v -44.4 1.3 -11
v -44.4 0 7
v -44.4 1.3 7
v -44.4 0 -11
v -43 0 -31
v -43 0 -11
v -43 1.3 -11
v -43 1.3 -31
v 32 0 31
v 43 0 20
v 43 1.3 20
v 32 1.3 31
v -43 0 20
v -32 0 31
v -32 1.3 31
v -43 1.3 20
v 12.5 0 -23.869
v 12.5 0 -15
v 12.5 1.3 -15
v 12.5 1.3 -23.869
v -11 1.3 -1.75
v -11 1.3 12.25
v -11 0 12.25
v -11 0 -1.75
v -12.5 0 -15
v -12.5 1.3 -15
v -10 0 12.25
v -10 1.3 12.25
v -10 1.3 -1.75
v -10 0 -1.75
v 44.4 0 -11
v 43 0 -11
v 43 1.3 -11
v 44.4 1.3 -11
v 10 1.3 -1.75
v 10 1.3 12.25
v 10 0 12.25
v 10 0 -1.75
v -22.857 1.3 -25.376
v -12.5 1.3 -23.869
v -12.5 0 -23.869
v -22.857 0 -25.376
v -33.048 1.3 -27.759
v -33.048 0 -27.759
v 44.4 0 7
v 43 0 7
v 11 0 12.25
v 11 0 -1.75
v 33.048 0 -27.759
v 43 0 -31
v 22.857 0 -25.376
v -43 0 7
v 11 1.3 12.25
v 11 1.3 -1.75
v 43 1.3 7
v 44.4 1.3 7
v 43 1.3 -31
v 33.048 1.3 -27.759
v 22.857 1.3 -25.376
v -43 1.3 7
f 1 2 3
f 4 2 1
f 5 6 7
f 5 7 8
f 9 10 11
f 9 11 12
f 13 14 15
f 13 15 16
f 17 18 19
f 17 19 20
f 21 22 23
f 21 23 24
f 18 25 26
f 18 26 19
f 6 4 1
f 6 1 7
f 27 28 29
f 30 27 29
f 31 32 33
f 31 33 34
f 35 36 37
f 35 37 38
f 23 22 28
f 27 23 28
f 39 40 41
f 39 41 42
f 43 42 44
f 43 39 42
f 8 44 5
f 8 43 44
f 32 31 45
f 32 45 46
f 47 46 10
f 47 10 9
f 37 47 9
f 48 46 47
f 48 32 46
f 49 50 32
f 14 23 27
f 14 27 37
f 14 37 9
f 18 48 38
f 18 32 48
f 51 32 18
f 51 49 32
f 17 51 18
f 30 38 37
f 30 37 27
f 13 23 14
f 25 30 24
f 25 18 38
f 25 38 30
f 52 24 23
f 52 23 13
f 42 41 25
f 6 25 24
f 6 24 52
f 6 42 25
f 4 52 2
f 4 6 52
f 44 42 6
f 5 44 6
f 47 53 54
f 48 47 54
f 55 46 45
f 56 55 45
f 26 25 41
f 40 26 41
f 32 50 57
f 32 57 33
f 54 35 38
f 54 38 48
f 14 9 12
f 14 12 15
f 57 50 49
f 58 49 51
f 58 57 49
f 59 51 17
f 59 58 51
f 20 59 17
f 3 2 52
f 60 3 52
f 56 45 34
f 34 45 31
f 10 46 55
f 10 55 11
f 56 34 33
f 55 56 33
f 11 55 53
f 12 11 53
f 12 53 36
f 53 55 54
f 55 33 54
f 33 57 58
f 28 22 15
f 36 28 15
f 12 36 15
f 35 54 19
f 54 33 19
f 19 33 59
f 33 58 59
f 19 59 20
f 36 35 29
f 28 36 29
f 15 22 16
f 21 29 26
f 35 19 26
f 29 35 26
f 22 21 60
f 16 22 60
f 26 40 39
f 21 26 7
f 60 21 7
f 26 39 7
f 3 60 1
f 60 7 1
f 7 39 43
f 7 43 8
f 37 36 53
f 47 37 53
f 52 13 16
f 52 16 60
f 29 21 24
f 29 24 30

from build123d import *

# Parameters (mm, degrees)
BOSS_EXTRUDE1_DEPTH = 1.3
SKETCH2_W           = 1.4
SKETCH2_H           = 18
BOSS_EXTRUDE2_DEPTH = 1.3
SKETCH2_3_W         = 25
SKETCH2_3_H         = 16
CUT_EXTRUDE1_DEPTH  = 55.166871794
CUT_EXTRUDE2_DEPTH  = 55.166871794
SKETCH7_W           = 1
SKETCH7_H           = 14
CUT_EXTRUDE3_DEPTH  = 55.166871794


with BuildPart() as part:
    # Sketch1 → Boss-Extrude1 (new body)
    with BuildSketch(Plane(origin=(0, 0, 0), x_dir=(1, 0, 0), z_dir=(0, 1, 0))):
        Polygon((-43, 31), (43, 31), (43, -20), (32, -31), (-32, -31), (-43, -20), align=None)
    extrude(amount=BOSS_EXTRUDE1_DEPTH)

    # Sketch2 → Boss-Extrude2 (add)
    with BuildSketch(Plane(origin=(0, 0, 0), x_dir=(1, 0, 0), z_dir=(0, 1, 0))):
        with Locations((43.7, 2)):
            Rectangle(SKETCH2_W, SKETCH2_H)
        with Locations((-43.7, 2)):
            Rectangle(SKETCH2_W, SKETCH2_H)
    extrude(amount=BOSS_EXTRUDE2_DEPTH)

    # Sketch2<3> → Cut-Extrude1 (cut, through all)
    with BuildSketch(Plane(origin=(0, 0, 0), x_dir=(1, 0, 0), z_dir=(0, 1, 0))):
        with Locations((0, 23)):
            Rectangle(SKETCH2_3_W, SKETCH2_3_H)
    extrude(amount=CUT_EXTRUDE1_DEPTH, mode=Mode.SUBTRACT)

    # Sketch6 → Cut-Extrude2 (cut, through all)
    with BuildSketch(Plane(origin=(0, 1.3, 0), x_dir=(1, 0, 0), z_dir=(0, 1, 0))):
        with BuildLine():
            Line((-43, 31), (43, 31))
            ThreePointArc((43, 31), (0, 23.231359566), (-43, 31))
        make_face()
    extrude(amount=-CUT_EXTRUDE2_DEPTH, mode=Mode.SUBTRACT)

    # Sketch7 → Cut-Extrude3 (cut, through all)
    with BuildSketch(Plane(origin=(0, 1.3, 0), x_dir=(1, 0, 0), z_dir=(0, 1, 0))):
        with Locations((-10.5, -5.25)):
            Rectangle(SKETCH7_W, SKETCH7_H)
        with Locations((10.5, -5.25)):
            Rectangle(SKETCH7_W, SKETCH7_H)
    extrude(amount=-CUT_EXTRUDE3_DEPTH, mode=Mode.SUBTRACT)


solid = part.part
